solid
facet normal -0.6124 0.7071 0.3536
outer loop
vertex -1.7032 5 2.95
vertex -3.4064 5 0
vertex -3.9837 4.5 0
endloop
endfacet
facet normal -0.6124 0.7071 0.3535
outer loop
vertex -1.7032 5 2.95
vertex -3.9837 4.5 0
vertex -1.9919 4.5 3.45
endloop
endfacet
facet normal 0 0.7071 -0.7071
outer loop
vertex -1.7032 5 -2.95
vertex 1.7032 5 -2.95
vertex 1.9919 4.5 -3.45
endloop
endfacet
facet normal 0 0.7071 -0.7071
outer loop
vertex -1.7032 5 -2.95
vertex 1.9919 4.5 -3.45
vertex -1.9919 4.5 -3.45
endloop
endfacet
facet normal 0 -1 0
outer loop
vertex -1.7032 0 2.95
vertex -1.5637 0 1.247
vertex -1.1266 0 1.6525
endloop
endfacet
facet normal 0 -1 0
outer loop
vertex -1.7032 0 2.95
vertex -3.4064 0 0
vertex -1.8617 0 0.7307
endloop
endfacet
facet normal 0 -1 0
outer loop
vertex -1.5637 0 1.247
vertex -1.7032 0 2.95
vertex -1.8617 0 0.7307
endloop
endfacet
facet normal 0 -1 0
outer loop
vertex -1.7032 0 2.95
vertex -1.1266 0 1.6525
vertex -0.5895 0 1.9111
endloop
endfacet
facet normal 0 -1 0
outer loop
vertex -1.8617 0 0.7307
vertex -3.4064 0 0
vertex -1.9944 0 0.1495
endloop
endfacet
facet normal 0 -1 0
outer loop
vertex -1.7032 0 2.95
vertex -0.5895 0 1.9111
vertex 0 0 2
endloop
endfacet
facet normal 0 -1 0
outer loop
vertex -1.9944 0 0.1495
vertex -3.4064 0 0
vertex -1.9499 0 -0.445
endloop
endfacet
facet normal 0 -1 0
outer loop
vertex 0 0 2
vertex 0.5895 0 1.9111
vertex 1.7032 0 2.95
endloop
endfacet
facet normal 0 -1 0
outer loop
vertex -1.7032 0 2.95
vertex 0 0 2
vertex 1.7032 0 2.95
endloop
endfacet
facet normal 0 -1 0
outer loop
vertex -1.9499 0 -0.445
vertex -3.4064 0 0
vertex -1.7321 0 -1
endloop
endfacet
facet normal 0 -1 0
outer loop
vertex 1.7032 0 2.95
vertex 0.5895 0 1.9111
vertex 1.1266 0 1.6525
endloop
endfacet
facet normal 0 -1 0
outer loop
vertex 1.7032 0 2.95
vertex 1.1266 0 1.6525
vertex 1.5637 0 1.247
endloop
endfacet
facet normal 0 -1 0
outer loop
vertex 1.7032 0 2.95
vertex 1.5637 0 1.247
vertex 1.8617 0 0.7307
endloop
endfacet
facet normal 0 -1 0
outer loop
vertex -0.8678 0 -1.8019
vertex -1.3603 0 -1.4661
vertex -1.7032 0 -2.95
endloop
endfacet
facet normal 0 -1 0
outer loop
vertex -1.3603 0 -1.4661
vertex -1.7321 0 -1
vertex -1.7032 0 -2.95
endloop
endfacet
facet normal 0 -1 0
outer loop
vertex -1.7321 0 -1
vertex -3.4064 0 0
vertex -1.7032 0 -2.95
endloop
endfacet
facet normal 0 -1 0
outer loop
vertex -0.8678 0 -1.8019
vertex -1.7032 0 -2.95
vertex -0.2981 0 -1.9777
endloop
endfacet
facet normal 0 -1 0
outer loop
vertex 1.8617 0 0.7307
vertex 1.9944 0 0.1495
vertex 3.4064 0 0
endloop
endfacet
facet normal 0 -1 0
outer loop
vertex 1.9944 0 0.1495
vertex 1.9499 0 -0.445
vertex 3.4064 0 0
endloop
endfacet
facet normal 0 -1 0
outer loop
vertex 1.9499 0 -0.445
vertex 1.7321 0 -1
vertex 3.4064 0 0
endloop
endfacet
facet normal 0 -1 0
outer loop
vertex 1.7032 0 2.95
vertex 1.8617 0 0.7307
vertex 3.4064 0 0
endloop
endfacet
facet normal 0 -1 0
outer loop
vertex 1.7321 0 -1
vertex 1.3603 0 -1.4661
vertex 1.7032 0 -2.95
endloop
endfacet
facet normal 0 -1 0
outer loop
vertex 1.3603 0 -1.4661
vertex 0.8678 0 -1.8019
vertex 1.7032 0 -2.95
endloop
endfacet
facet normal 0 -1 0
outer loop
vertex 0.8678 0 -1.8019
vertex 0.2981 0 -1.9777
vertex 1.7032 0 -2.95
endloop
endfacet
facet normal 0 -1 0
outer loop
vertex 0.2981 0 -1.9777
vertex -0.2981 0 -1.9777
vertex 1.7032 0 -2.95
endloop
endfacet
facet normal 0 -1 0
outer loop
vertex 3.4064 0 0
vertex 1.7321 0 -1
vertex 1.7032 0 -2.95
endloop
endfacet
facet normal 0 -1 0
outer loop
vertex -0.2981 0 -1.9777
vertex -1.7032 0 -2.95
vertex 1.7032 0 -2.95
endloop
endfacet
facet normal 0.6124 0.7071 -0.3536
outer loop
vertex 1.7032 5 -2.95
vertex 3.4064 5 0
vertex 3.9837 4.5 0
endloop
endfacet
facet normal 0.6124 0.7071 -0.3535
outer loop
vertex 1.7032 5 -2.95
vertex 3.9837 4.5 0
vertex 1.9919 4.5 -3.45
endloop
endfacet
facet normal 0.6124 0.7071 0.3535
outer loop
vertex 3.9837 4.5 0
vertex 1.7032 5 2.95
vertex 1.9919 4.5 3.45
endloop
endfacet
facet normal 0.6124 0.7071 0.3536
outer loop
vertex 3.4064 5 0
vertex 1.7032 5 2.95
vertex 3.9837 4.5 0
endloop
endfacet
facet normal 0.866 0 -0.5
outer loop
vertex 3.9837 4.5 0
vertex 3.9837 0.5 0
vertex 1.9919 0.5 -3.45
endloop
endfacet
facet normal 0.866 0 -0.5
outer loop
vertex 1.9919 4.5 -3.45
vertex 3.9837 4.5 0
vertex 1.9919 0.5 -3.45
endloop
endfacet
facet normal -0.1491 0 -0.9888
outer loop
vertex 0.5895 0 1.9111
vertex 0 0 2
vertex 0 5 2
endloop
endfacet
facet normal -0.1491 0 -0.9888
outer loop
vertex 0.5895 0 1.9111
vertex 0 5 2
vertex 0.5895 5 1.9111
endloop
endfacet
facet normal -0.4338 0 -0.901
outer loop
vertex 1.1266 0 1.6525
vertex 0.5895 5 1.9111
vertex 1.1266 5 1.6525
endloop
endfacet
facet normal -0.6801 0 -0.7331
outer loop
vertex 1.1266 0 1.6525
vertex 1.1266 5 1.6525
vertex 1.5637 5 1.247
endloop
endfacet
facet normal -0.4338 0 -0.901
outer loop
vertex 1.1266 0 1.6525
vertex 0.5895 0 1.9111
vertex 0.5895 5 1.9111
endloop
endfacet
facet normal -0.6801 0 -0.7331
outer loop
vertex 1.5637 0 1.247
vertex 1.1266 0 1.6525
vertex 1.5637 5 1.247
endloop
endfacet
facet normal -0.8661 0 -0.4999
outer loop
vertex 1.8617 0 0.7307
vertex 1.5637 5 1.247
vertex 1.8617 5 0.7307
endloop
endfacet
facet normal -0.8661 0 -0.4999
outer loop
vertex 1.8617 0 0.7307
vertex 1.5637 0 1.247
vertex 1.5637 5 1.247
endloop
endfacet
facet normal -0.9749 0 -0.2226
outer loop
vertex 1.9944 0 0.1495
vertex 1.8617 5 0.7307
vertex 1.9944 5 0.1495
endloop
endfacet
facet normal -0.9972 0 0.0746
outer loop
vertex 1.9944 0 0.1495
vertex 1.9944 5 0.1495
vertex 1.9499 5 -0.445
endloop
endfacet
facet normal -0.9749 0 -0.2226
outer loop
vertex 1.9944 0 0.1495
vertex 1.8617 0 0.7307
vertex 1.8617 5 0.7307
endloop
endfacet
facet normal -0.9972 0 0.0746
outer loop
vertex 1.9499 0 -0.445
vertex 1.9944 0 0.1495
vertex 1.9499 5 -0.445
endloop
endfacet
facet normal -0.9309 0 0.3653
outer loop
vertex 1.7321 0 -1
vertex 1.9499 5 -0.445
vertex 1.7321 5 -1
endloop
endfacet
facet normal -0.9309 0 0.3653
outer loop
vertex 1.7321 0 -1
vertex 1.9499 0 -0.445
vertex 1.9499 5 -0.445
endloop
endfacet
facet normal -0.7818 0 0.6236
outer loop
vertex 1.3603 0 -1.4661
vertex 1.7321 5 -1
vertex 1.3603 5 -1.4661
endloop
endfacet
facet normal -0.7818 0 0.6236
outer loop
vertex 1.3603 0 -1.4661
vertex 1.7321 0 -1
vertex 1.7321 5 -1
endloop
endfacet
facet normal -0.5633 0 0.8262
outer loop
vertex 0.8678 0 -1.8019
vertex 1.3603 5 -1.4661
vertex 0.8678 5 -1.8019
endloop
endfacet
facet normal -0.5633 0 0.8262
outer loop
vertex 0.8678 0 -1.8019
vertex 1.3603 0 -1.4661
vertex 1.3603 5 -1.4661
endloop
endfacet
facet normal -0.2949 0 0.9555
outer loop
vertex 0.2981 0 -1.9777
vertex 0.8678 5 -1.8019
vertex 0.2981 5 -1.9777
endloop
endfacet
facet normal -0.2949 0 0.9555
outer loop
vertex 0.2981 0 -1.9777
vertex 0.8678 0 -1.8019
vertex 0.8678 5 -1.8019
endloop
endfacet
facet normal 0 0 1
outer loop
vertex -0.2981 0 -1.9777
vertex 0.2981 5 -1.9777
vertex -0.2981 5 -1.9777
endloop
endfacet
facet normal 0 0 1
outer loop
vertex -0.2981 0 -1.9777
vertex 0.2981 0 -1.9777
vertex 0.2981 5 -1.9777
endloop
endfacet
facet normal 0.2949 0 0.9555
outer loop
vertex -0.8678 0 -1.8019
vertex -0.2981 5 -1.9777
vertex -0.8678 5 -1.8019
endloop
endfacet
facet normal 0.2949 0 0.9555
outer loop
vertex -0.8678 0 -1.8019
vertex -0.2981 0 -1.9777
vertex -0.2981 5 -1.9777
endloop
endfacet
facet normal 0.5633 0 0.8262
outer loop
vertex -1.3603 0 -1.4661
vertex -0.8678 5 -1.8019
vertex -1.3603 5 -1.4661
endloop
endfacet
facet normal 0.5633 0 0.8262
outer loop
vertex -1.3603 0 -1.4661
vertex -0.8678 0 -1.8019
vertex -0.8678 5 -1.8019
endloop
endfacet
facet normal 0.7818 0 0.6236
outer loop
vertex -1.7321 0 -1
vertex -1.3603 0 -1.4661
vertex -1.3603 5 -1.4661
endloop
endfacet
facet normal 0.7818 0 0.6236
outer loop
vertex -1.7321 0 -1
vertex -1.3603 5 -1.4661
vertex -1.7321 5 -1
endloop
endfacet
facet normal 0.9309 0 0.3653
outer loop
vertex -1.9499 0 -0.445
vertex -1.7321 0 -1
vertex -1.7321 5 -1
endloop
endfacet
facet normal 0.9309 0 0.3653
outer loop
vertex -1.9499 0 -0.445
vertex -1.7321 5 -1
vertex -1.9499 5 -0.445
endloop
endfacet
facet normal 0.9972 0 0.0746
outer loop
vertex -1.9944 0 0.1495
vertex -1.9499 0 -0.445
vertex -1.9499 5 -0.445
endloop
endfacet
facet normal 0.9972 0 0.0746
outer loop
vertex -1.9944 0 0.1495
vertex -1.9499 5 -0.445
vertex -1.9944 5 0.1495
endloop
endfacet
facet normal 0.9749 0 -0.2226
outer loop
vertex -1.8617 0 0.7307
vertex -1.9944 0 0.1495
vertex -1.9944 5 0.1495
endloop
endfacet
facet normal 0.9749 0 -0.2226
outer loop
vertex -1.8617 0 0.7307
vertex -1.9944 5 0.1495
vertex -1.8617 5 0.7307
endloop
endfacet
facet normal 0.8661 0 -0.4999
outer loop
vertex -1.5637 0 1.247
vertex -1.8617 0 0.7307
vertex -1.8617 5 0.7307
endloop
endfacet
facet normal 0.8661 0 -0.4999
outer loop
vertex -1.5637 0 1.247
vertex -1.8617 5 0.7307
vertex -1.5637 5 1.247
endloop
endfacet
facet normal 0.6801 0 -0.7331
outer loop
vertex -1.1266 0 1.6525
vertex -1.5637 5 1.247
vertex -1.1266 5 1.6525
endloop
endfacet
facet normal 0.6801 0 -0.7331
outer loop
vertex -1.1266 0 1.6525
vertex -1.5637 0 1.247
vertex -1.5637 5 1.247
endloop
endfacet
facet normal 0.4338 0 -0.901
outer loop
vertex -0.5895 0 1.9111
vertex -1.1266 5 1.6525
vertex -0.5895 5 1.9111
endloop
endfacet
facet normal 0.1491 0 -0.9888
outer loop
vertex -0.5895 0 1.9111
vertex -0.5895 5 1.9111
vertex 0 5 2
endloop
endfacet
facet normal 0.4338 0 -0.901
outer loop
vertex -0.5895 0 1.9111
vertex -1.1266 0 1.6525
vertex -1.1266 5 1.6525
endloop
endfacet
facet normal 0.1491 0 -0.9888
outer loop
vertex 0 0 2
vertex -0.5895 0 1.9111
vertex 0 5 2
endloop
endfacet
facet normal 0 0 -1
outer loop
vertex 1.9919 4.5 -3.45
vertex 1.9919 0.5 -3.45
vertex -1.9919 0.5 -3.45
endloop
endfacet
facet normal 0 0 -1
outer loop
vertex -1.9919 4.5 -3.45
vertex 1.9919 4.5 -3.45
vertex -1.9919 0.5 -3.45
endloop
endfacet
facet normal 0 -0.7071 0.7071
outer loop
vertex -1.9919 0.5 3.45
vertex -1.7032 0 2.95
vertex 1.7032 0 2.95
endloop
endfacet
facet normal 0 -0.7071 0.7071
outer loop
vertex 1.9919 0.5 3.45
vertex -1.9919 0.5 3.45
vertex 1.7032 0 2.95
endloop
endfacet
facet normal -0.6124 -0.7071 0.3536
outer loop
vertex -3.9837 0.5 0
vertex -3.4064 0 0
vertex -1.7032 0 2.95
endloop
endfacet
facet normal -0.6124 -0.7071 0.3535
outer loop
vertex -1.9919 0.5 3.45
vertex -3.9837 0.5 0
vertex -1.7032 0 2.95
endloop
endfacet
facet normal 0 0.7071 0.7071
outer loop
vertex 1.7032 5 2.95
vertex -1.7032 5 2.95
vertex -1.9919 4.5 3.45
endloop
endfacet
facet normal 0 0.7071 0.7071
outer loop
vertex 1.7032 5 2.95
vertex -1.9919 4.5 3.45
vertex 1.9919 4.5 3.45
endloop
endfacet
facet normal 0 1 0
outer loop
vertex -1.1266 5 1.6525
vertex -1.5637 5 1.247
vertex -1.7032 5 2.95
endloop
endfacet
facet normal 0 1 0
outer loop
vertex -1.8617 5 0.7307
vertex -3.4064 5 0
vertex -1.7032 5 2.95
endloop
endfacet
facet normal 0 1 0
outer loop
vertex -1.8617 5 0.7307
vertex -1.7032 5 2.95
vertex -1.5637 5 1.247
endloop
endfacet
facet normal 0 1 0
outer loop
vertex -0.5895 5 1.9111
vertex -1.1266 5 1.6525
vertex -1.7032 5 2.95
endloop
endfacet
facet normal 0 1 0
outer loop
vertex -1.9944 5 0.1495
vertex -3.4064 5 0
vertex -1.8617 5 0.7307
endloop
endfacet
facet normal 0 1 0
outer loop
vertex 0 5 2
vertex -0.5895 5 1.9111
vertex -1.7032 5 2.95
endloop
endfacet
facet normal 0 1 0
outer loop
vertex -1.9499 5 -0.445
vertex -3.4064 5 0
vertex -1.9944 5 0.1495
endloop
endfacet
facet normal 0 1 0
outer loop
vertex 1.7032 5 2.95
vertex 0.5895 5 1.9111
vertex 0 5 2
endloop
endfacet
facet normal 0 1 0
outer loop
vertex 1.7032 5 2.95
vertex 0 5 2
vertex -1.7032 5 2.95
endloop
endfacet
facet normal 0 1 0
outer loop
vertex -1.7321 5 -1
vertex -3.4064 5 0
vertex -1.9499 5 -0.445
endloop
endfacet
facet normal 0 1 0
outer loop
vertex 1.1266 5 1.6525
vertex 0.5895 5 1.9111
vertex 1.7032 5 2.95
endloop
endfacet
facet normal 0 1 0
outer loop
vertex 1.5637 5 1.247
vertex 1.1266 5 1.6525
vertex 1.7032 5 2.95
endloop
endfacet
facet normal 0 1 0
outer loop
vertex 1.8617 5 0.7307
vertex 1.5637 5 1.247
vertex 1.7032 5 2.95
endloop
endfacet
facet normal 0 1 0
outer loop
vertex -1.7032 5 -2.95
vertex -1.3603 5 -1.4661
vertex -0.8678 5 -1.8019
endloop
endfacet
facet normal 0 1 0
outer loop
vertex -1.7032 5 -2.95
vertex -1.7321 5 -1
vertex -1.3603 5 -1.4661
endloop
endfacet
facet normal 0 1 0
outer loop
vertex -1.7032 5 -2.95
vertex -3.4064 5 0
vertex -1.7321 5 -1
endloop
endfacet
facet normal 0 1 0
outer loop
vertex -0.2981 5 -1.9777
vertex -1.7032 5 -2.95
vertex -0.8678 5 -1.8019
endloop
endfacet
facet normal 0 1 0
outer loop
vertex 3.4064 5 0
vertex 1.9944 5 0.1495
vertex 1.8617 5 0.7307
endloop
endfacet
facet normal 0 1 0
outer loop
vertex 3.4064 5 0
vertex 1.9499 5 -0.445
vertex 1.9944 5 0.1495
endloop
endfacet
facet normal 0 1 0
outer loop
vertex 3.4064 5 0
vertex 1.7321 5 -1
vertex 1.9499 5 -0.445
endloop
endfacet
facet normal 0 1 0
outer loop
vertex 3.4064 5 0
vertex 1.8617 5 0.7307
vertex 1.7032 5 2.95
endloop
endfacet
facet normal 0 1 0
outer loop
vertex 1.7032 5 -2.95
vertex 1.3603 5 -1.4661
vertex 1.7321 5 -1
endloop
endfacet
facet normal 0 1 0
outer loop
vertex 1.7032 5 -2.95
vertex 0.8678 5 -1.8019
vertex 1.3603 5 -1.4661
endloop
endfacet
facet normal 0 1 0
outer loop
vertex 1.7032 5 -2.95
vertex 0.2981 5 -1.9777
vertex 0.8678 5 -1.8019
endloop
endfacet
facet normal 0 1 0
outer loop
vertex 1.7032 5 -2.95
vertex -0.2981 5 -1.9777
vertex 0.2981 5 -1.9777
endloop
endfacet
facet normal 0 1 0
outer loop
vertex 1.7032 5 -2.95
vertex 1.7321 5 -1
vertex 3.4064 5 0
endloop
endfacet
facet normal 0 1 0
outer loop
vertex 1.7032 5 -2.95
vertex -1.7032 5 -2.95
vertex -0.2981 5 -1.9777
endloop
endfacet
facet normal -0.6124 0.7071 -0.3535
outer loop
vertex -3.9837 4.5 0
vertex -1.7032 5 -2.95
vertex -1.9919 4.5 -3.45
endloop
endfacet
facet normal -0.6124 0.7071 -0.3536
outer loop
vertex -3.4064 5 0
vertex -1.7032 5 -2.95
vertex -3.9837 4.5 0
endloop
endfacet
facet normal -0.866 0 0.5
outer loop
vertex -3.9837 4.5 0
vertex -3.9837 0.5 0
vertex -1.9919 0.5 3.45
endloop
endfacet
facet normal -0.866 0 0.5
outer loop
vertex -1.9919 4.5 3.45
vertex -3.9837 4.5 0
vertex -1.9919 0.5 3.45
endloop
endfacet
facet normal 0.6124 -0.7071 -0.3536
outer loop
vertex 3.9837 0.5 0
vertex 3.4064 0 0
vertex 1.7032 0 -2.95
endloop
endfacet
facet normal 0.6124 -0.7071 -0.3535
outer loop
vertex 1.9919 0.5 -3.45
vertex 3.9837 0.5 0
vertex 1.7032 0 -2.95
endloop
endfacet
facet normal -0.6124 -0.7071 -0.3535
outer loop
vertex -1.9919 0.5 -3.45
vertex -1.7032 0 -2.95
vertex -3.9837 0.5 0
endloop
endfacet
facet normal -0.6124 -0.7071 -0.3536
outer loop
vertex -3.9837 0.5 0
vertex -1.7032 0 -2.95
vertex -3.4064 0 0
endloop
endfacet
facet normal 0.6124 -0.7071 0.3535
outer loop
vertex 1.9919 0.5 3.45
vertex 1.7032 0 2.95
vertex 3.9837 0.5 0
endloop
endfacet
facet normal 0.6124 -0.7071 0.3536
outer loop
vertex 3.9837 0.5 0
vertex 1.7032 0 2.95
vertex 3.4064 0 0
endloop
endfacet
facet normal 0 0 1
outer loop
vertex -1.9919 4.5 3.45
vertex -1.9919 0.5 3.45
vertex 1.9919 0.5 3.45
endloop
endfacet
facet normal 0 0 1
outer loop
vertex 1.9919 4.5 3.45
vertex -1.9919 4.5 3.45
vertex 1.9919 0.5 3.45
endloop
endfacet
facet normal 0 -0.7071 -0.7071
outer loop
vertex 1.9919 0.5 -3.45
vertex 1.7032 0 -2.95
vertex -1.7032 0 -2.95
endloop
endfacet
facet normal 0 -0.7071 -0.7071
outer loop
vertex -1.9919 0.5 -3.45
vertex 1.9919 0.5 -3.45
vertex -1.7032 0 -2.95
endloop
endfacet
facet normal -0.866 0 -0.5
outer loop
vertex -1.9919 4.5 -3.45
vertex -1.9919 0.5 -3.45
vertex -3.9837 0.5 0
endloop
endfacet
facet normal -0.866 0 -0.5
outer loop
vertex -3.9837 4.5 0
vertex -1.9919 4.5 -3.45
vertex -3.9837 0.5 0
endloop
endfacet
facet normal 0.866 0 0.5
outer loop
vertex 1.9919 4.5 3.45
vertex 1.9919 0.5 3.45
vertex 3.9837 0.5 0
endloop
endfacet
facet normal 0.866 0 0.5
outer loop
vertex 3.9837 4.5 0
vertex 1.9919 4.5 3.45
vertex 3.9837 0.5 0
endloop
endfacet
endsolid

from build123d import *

# Parameters (mm, degrees)
SKETCH_1_R      = 2
EXTRUDE_1_DEPTH = 5
CHAMFER_1_SIZE  = 0.5


with BuildPart() as part:
    # 草图1 → 凸台-拉伸1 (new body)
    with BuildSketch(Plane(origin=(0, 0, 0), x_dir=(1, 0, 0), z_dir=(0, 1, 0))):
        Polygon((-3.983716857, 0), (-1.991858429, -3.45), (1.991858429, -3.45), (3.983716857, 0), (1.991858429, 3.45), (-1.991858429, 3.45), align=None)
        with Locations(Location((0, 0, 0), (0, 0, 270))):
            Circle(SKETCH_1_R, mode=Mode.SUBTRACT)
    extrude(amount=EXTRUDE_1_DEPTH)

    # 倒角1
    chamfer_1_edges = [part.edges().sort_by_distance(p)[0] for p in [
        (0, 5, 3.45),
        (2.987787643, 5, 1.725),
        (2.987787643, 5, -1.725),
        (0, 5, -3.45),
        (-2.987787643, 5, -1.725),
        (0, 0, -3.45),
        (2.987787643, 0, -1.725),
        (2.987787643, 0, 1.725),
        (0, 0, 3.45),
        (-2.987787643, 0, 1.725),
        (-2.987787643, 0, -1.725),
        (-2.987787643, 5, 1.725),
    ]]
    chamfer(chamfer_1_edges, length=CHAMFER_1_SIZE)


solid = part.part
